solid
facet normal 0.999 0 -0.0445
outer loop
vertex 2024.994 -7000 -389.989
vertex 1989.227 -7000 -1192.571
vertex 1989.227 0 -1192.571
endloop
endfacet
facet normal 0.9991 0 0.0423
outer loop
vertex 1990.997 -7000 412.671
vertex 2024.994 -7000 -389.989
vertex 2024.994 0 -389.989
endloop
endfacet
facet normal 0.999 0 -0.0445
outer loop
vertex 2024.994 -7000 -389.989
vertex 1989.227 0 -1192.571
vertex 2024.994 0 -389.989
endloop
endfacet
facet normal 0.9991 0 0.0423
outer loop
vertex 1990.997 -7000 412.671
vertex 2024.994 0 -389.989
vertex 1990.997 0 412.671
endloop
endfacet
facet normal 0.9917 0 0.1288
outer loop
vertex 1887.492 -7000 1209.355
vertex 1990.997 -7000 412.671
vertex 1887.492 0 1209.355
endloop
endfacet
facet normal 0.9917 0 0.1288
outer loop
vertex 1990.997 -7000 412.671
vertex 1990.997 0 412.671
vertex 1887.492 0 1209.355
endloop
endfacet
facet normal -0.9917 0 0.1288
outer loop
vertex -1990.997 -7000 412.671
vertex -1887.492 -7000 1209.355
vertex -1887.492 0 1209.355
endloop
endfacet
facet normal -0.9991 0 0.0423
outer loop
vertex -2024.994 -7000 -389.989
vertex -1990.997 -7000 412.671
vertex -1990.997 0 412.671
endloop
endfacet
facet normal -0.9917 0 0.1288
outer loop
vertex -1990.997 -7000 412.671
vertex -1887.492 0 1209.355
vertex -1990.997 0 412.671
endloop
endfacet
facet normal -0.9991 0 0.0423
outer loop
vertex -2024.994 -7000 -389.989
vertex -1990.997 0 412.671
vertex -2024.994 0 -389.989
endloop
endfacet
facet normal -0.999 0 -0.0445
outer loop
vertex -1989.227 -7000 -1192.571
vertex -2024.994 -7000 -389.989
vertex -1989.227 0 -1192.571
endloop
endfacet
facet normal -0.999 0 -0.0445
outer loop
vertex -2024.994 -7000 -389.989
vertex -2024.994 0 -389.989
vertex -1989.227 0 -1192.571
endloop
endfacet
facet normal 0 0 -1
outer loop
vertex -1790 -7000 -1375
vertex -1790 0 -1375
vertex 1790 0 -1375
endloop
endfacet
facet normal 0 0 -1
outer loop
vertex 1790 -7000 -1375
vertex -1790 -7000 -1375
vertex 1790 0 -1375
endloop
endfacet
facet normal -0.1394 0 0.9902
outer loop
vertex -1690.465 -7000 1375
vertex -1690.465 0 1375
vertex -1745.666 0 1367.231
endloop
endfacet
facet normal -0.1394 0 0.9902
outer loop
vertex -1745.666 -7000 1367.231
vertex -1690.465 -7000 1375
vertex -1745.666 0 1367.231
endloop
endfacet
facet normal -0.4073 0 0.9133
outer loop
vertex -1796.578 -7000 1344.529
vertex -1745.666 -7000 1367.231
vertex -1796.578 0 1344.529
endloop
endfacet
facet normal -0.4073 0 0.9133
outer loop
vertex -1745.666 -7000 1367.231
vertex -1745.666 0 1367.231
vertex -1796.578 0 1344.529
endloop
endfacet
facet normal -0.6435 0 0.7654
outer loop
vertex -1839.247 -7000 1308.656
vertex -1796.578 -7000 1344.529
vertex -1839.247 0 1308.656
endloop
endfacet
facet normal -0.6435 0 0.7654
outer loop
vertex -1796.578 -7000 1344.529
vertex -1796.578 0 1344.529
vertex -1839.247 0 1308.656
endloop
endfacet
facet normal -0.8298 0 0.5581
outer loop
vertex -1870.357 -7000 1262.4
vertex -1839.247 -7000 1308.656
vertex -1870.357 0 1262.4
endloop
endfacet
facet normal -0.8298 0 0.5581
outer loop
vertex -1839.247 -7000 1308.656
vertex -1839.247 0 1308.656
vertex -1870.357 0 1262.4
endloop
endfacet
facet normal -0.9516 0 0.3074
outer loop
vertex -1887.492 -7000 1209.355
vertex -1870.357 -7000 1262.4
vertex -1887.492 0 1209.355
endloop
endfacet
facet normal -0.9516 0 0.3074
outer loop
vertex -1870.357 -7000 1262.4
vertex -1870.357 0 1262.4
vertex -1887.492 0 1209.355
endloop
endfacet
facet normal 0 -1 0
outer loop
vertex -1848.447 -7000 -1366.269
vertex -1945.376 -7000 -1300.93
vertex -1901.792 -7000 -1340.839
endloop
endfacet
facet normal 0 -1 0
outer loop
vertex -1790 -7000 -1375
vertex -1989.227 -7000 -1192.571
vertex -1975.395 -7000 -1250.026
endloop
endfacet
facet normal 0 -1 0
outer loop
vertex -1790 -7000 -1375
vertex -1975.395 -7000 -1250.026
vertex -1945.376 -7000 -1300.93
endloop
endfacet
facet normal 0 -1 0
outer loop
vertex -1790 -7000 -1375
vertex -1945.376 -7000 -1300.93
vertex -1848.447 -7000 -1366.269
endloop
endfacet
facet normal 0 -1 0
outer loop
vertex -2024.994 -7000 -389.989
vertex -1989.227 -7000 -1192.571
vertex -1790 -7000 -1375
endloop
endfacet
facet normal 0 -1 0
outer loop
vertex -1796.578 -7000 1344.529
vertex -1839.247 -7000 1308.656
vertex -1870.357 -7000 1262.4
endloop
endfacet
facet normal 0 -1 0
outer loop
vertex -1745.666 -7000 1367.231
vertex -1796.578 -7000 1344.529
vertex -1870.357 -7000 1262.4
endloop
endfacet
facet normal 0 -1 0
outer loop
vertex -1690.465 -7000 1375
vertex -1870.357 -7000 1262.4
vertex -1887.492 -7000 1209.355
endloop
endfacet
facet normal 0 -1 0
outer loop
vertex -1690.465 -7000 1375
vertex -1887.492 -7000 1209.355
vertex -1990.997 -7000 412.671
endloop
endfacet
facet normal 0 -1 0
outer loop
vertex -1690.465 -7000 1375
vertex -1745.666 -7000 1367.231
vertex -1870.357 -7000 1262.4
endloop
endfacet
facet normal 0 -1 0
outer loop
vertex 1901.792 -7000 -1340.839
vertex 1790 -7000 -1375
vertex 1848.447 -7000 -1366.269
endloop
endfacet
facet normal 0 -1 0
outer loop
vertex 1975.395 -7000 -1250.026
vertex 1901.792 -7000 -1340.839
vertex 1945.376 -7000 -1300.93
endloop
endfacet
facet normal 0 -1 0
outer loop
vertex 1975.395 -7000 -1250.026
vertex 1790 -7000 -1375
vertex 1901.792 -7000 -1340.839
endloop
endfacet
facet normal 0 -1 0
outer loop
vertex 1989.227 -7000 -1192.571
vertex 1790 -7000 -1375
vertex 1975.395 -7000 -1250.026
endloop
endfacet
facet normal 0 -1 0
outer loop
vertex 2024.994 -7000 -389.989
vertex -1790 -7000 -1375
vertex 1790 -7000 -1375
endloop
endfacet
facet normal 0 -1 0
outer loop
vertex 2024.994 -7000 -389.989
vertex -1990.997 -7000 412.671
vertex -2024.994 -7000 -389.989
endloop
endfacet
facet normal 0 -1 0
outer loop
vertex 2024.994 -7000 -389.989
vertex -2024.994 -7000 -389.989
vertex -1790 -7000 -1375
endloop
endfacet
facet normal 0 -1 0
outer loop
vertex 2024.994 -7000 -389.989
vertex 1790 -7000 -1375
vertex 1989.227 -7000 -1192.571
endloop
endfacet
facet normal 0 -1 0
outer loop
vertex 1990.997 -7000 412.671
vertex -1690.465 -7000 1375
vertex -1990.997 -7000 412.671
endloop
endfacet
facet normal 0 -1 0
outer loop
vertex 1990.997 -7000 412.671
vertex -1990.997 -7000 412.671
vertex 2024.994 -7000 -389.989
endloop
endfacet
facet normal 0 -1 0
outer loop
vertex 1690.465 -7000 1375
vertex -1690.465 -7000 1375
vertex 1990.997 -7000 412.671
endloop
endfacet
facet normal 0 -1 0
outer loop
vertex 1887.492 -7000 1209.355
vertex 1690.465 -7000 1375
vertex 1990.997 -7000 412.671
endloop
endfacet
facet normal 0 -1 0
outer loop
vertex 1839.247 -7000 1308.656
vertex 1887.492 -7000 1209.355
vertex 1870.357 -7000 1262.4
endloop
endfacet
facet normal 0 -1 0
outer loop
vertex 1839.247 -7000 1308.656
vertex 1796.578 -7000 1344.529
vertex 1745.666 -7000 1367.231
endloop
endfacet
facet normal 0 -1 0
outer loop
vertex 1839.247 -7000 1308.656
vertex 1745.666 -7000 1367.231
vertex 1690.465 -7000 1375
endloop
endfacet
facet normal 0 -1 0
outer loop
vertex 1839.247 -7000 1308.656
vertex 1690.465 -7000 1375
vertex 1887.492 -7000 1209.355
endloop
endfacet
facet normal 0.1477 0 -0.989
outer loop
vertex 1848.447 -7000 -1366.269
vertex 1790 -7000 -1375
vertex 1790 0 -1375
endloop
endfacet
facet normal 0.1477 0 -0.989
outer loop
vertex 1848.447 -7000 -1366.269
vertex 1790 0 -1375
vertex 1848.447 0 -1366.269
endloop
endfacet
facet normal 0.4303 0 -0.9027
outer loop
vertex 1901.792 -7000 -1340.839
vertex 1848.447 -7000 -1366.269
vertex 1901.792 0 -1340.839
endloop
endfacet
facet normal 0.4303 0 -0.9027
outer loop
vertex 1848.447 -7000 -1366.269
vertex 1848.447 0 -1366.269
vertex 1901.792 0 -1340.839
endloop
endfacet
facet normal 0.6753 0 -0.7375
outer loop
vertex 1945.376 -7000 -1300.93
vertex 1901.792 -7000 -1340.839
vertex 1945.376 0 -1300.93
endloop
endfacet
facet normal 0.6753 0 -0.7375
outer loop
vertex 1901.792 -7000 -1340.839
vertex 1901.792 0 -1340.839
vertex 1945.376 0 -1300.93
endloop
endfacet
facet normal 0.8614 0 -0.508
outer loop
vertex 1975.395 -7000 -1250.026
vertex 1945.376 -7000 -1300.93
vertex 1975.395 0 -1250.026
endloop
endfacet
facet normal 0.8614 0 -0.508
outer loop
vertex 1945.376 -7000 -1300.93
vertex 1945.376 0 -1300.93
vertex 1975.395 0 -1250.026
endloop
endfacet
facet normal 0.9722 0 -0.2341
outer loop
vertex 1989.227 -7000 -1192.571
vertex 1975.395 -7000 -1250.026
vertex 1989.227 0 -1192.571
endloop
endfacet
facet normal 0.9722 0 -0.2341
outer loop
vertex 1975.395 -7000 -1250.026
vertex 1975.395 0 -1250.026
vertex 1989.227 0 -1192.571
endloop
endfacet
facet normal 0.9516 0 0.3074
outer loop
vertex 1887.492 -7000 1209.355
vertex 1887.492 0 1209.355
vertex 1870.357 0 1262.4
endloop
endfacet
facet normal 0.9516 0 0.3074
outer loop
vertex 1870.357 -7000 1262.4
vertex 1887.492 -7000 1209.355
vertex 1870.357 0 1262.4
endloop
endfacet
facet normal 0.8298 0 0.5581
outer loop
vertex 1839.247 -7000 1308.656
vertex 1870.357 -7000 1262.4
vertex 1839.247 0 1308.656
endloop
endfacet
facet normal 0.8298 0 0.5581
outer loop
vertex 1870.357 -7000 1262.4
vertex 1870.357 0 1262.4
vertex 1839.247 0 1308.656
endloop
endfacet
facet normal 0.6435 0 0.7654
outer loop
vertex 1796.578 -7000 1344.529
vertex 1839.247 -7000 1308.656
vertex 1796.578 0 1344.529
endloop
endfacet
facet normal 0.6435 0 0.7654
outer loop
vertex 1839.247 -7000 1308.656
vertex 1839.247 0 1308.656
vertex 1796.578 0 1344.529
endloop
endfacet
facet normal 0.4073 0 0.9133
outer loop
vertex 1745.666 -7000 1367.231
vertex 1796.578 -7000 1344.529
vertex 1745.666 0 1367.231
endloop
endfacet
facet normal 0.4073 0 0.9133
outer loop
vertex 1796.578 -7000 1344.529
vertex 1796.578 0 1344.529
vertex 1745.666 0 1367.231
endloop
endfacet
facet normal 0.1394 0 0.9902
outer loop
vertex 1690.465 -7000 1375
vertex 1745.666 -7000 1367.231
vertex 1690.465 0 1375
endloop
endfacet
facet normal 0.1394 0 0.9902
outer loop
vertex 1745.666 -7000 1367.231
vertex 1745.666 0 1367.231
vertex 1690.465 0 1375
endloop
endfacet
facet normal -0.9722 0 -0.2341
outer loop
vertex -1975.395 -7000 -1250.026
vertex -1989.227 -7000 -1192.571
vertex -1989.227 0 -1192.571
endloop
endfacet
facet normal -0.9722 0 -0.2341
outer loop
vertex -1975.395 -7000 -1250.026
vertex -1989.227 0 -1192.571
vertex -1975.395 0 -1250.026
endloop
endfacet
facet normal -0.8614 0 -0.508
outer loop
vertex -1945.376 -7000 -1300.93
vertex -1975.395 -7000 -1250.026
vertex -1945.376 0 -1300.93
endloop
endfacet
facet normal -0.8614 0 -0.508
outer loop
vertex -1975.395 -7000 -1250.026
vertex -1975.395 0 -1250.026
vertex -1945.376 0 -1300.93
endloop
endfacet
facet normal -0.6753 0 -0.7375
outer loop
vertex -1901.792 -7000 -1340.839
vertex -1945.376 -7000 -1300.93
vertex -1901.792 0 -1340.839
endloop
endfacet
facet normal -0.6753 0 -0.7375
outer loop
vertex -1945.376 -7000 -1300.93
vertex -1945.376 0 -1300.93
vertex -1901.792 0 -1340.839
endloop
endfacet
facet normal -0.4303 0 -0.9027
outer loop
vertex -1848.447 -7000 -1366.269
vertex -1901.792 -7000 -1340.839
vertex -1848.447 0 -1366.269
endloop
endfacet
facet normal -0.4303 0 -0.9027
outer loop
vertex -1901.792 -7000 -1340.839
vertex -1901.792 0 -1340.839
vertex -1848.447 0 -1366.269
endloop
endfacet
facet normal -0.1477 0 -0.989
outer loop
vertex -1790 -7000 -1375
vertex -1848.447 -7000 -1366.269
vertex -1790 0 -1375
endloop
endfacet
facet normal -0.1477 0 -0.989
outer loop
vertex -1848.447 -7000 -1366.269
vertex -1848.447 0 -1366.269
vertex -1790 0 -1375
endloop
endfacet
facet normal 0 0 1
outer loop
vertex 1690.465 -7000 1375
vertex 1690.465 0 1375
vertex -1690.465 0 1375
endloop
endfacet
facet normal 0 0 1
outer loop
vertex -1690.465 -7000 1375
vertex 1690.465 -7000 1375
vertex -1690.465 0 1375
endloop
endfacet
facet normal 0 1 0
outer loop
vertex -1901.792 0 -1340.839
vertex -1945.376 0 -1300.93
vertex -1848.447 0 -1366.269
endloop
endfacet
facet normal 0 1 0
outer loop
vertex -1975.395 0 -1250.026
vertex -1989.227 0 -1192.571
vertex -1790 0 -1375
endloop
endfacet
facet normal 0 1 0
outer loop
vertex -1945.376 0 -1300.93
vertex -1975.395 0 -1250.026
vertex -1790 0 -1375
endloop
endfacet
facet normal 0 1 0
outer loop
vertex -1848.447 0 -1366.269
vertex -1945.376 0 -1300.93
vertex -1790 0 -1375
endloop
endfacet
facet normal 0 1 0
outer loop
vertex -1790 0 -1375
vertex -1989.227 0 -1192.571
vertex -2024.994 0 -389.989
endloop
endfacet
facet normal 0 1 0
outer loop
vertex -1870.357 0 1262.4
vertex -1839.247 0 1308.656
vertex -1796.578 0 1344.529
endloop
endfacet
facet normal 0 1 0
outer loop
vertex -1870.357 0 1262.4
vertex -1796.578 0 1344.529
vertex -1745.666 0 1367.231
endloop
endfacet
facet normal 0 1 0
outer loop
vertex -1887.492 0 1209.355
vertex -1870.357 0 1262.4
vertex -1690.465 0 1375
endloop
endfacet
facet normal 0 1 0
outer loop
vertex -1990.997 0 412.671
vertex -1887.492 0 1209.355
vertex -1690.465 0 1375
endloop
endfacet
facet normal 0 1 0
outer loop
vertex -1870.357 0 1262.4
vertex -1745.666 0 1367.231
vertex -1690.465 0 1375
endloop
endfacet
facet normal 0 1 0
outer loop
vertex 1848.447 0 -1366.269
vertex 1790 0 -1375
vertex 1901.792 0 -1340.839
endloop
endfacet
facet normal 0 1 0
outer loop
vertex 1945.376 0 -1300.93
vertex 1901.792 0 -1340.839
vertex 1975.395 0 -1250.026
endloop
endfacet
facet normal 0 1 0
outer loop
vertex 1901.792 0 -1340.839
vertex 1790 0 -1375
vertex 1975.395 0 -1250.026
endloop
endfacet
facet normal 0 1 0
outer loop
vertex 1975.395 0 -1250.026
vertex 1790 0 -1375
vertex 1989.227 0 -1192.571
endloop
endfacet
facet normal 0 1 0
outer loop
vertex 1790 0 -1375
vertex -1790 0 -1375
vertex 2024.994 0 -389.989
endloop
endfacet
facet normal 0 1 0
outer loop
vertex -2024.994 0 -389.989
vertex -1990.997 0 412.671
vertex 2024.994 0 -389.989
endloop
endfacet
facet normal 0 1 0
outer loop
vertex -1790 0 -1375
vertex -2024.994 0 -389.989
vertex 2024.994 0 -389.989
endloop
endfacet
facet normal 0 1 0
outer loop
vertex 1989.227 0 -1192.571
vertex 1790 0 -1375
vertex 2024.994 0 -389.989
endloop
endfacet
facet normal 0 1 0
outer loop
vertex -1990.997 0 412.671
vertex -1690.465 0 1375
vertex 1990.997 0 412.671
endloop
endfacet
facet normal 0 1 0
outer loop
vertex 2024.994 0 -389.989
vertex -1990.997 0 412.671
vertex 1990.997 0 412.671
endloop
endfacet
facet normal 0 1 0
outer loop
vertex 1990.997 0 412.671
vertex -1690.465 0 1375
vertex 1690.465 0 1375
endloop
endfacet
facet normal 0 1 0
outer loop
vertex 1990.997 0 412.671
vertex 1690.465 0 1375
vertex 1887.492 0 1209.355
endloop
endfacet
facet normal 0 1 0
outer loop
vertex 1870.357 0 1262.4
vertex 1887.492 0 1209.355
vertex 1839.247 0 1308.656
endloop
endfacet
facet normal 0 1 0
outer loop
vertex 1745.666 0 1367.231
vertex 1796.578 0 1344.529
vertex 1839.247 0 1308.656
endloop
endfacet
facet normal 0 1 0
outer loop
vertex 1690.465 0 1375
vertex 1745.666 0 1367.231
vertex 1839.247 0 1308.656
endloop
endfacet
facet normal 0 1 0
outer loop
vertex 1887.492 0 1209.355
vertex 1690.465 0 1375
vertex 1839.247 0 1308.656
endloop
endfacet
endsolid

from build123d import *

# Parameters (mm, degrees)
F1_DEPTH = 7000


with BuildPart() as f1:
    # F0 (on Front) → F1 (new body)
    with BuildSketch(Plane.XZ):
        with BuildLine():
            ThreePointArc((-1989.226635, -1192.57122), (-1925.066198, -1322.502956), (-1790, -1375))
            Line((-1790, -1375), (0, -1375))
            Line((0, -1375), (1790, -1375))
            ThreePointArc((1790, -1375), (1925.066198, -1322.502956), (1989.226635, -1192.57122))
            ThreePointArc((1989.226635, -1192.57122), (2016.712793, 11.710421), (1887.49222, 1209.354695))
            ThreePointArc((1887.49222, 1209.354695), (1819.168191, 1328.086477), (1690.464925, 1375))
            Line((1690.464925, 1375), (0, 1375))
            Line((0, 1375), (-1690.464925, 1375))
            ThreePointArc((-1690.464925, 1375), (-1819.168191, 1328.086477), (-1887.49222, 1209.354695))
            ThreePointArc((-1887.49222, 1209.354695), (-2016.712793, 11.710421), (-1989.226635, -1192.57122))
        make_face()
    extrude(amount=F1_DEPTH)


solid = f1.part
